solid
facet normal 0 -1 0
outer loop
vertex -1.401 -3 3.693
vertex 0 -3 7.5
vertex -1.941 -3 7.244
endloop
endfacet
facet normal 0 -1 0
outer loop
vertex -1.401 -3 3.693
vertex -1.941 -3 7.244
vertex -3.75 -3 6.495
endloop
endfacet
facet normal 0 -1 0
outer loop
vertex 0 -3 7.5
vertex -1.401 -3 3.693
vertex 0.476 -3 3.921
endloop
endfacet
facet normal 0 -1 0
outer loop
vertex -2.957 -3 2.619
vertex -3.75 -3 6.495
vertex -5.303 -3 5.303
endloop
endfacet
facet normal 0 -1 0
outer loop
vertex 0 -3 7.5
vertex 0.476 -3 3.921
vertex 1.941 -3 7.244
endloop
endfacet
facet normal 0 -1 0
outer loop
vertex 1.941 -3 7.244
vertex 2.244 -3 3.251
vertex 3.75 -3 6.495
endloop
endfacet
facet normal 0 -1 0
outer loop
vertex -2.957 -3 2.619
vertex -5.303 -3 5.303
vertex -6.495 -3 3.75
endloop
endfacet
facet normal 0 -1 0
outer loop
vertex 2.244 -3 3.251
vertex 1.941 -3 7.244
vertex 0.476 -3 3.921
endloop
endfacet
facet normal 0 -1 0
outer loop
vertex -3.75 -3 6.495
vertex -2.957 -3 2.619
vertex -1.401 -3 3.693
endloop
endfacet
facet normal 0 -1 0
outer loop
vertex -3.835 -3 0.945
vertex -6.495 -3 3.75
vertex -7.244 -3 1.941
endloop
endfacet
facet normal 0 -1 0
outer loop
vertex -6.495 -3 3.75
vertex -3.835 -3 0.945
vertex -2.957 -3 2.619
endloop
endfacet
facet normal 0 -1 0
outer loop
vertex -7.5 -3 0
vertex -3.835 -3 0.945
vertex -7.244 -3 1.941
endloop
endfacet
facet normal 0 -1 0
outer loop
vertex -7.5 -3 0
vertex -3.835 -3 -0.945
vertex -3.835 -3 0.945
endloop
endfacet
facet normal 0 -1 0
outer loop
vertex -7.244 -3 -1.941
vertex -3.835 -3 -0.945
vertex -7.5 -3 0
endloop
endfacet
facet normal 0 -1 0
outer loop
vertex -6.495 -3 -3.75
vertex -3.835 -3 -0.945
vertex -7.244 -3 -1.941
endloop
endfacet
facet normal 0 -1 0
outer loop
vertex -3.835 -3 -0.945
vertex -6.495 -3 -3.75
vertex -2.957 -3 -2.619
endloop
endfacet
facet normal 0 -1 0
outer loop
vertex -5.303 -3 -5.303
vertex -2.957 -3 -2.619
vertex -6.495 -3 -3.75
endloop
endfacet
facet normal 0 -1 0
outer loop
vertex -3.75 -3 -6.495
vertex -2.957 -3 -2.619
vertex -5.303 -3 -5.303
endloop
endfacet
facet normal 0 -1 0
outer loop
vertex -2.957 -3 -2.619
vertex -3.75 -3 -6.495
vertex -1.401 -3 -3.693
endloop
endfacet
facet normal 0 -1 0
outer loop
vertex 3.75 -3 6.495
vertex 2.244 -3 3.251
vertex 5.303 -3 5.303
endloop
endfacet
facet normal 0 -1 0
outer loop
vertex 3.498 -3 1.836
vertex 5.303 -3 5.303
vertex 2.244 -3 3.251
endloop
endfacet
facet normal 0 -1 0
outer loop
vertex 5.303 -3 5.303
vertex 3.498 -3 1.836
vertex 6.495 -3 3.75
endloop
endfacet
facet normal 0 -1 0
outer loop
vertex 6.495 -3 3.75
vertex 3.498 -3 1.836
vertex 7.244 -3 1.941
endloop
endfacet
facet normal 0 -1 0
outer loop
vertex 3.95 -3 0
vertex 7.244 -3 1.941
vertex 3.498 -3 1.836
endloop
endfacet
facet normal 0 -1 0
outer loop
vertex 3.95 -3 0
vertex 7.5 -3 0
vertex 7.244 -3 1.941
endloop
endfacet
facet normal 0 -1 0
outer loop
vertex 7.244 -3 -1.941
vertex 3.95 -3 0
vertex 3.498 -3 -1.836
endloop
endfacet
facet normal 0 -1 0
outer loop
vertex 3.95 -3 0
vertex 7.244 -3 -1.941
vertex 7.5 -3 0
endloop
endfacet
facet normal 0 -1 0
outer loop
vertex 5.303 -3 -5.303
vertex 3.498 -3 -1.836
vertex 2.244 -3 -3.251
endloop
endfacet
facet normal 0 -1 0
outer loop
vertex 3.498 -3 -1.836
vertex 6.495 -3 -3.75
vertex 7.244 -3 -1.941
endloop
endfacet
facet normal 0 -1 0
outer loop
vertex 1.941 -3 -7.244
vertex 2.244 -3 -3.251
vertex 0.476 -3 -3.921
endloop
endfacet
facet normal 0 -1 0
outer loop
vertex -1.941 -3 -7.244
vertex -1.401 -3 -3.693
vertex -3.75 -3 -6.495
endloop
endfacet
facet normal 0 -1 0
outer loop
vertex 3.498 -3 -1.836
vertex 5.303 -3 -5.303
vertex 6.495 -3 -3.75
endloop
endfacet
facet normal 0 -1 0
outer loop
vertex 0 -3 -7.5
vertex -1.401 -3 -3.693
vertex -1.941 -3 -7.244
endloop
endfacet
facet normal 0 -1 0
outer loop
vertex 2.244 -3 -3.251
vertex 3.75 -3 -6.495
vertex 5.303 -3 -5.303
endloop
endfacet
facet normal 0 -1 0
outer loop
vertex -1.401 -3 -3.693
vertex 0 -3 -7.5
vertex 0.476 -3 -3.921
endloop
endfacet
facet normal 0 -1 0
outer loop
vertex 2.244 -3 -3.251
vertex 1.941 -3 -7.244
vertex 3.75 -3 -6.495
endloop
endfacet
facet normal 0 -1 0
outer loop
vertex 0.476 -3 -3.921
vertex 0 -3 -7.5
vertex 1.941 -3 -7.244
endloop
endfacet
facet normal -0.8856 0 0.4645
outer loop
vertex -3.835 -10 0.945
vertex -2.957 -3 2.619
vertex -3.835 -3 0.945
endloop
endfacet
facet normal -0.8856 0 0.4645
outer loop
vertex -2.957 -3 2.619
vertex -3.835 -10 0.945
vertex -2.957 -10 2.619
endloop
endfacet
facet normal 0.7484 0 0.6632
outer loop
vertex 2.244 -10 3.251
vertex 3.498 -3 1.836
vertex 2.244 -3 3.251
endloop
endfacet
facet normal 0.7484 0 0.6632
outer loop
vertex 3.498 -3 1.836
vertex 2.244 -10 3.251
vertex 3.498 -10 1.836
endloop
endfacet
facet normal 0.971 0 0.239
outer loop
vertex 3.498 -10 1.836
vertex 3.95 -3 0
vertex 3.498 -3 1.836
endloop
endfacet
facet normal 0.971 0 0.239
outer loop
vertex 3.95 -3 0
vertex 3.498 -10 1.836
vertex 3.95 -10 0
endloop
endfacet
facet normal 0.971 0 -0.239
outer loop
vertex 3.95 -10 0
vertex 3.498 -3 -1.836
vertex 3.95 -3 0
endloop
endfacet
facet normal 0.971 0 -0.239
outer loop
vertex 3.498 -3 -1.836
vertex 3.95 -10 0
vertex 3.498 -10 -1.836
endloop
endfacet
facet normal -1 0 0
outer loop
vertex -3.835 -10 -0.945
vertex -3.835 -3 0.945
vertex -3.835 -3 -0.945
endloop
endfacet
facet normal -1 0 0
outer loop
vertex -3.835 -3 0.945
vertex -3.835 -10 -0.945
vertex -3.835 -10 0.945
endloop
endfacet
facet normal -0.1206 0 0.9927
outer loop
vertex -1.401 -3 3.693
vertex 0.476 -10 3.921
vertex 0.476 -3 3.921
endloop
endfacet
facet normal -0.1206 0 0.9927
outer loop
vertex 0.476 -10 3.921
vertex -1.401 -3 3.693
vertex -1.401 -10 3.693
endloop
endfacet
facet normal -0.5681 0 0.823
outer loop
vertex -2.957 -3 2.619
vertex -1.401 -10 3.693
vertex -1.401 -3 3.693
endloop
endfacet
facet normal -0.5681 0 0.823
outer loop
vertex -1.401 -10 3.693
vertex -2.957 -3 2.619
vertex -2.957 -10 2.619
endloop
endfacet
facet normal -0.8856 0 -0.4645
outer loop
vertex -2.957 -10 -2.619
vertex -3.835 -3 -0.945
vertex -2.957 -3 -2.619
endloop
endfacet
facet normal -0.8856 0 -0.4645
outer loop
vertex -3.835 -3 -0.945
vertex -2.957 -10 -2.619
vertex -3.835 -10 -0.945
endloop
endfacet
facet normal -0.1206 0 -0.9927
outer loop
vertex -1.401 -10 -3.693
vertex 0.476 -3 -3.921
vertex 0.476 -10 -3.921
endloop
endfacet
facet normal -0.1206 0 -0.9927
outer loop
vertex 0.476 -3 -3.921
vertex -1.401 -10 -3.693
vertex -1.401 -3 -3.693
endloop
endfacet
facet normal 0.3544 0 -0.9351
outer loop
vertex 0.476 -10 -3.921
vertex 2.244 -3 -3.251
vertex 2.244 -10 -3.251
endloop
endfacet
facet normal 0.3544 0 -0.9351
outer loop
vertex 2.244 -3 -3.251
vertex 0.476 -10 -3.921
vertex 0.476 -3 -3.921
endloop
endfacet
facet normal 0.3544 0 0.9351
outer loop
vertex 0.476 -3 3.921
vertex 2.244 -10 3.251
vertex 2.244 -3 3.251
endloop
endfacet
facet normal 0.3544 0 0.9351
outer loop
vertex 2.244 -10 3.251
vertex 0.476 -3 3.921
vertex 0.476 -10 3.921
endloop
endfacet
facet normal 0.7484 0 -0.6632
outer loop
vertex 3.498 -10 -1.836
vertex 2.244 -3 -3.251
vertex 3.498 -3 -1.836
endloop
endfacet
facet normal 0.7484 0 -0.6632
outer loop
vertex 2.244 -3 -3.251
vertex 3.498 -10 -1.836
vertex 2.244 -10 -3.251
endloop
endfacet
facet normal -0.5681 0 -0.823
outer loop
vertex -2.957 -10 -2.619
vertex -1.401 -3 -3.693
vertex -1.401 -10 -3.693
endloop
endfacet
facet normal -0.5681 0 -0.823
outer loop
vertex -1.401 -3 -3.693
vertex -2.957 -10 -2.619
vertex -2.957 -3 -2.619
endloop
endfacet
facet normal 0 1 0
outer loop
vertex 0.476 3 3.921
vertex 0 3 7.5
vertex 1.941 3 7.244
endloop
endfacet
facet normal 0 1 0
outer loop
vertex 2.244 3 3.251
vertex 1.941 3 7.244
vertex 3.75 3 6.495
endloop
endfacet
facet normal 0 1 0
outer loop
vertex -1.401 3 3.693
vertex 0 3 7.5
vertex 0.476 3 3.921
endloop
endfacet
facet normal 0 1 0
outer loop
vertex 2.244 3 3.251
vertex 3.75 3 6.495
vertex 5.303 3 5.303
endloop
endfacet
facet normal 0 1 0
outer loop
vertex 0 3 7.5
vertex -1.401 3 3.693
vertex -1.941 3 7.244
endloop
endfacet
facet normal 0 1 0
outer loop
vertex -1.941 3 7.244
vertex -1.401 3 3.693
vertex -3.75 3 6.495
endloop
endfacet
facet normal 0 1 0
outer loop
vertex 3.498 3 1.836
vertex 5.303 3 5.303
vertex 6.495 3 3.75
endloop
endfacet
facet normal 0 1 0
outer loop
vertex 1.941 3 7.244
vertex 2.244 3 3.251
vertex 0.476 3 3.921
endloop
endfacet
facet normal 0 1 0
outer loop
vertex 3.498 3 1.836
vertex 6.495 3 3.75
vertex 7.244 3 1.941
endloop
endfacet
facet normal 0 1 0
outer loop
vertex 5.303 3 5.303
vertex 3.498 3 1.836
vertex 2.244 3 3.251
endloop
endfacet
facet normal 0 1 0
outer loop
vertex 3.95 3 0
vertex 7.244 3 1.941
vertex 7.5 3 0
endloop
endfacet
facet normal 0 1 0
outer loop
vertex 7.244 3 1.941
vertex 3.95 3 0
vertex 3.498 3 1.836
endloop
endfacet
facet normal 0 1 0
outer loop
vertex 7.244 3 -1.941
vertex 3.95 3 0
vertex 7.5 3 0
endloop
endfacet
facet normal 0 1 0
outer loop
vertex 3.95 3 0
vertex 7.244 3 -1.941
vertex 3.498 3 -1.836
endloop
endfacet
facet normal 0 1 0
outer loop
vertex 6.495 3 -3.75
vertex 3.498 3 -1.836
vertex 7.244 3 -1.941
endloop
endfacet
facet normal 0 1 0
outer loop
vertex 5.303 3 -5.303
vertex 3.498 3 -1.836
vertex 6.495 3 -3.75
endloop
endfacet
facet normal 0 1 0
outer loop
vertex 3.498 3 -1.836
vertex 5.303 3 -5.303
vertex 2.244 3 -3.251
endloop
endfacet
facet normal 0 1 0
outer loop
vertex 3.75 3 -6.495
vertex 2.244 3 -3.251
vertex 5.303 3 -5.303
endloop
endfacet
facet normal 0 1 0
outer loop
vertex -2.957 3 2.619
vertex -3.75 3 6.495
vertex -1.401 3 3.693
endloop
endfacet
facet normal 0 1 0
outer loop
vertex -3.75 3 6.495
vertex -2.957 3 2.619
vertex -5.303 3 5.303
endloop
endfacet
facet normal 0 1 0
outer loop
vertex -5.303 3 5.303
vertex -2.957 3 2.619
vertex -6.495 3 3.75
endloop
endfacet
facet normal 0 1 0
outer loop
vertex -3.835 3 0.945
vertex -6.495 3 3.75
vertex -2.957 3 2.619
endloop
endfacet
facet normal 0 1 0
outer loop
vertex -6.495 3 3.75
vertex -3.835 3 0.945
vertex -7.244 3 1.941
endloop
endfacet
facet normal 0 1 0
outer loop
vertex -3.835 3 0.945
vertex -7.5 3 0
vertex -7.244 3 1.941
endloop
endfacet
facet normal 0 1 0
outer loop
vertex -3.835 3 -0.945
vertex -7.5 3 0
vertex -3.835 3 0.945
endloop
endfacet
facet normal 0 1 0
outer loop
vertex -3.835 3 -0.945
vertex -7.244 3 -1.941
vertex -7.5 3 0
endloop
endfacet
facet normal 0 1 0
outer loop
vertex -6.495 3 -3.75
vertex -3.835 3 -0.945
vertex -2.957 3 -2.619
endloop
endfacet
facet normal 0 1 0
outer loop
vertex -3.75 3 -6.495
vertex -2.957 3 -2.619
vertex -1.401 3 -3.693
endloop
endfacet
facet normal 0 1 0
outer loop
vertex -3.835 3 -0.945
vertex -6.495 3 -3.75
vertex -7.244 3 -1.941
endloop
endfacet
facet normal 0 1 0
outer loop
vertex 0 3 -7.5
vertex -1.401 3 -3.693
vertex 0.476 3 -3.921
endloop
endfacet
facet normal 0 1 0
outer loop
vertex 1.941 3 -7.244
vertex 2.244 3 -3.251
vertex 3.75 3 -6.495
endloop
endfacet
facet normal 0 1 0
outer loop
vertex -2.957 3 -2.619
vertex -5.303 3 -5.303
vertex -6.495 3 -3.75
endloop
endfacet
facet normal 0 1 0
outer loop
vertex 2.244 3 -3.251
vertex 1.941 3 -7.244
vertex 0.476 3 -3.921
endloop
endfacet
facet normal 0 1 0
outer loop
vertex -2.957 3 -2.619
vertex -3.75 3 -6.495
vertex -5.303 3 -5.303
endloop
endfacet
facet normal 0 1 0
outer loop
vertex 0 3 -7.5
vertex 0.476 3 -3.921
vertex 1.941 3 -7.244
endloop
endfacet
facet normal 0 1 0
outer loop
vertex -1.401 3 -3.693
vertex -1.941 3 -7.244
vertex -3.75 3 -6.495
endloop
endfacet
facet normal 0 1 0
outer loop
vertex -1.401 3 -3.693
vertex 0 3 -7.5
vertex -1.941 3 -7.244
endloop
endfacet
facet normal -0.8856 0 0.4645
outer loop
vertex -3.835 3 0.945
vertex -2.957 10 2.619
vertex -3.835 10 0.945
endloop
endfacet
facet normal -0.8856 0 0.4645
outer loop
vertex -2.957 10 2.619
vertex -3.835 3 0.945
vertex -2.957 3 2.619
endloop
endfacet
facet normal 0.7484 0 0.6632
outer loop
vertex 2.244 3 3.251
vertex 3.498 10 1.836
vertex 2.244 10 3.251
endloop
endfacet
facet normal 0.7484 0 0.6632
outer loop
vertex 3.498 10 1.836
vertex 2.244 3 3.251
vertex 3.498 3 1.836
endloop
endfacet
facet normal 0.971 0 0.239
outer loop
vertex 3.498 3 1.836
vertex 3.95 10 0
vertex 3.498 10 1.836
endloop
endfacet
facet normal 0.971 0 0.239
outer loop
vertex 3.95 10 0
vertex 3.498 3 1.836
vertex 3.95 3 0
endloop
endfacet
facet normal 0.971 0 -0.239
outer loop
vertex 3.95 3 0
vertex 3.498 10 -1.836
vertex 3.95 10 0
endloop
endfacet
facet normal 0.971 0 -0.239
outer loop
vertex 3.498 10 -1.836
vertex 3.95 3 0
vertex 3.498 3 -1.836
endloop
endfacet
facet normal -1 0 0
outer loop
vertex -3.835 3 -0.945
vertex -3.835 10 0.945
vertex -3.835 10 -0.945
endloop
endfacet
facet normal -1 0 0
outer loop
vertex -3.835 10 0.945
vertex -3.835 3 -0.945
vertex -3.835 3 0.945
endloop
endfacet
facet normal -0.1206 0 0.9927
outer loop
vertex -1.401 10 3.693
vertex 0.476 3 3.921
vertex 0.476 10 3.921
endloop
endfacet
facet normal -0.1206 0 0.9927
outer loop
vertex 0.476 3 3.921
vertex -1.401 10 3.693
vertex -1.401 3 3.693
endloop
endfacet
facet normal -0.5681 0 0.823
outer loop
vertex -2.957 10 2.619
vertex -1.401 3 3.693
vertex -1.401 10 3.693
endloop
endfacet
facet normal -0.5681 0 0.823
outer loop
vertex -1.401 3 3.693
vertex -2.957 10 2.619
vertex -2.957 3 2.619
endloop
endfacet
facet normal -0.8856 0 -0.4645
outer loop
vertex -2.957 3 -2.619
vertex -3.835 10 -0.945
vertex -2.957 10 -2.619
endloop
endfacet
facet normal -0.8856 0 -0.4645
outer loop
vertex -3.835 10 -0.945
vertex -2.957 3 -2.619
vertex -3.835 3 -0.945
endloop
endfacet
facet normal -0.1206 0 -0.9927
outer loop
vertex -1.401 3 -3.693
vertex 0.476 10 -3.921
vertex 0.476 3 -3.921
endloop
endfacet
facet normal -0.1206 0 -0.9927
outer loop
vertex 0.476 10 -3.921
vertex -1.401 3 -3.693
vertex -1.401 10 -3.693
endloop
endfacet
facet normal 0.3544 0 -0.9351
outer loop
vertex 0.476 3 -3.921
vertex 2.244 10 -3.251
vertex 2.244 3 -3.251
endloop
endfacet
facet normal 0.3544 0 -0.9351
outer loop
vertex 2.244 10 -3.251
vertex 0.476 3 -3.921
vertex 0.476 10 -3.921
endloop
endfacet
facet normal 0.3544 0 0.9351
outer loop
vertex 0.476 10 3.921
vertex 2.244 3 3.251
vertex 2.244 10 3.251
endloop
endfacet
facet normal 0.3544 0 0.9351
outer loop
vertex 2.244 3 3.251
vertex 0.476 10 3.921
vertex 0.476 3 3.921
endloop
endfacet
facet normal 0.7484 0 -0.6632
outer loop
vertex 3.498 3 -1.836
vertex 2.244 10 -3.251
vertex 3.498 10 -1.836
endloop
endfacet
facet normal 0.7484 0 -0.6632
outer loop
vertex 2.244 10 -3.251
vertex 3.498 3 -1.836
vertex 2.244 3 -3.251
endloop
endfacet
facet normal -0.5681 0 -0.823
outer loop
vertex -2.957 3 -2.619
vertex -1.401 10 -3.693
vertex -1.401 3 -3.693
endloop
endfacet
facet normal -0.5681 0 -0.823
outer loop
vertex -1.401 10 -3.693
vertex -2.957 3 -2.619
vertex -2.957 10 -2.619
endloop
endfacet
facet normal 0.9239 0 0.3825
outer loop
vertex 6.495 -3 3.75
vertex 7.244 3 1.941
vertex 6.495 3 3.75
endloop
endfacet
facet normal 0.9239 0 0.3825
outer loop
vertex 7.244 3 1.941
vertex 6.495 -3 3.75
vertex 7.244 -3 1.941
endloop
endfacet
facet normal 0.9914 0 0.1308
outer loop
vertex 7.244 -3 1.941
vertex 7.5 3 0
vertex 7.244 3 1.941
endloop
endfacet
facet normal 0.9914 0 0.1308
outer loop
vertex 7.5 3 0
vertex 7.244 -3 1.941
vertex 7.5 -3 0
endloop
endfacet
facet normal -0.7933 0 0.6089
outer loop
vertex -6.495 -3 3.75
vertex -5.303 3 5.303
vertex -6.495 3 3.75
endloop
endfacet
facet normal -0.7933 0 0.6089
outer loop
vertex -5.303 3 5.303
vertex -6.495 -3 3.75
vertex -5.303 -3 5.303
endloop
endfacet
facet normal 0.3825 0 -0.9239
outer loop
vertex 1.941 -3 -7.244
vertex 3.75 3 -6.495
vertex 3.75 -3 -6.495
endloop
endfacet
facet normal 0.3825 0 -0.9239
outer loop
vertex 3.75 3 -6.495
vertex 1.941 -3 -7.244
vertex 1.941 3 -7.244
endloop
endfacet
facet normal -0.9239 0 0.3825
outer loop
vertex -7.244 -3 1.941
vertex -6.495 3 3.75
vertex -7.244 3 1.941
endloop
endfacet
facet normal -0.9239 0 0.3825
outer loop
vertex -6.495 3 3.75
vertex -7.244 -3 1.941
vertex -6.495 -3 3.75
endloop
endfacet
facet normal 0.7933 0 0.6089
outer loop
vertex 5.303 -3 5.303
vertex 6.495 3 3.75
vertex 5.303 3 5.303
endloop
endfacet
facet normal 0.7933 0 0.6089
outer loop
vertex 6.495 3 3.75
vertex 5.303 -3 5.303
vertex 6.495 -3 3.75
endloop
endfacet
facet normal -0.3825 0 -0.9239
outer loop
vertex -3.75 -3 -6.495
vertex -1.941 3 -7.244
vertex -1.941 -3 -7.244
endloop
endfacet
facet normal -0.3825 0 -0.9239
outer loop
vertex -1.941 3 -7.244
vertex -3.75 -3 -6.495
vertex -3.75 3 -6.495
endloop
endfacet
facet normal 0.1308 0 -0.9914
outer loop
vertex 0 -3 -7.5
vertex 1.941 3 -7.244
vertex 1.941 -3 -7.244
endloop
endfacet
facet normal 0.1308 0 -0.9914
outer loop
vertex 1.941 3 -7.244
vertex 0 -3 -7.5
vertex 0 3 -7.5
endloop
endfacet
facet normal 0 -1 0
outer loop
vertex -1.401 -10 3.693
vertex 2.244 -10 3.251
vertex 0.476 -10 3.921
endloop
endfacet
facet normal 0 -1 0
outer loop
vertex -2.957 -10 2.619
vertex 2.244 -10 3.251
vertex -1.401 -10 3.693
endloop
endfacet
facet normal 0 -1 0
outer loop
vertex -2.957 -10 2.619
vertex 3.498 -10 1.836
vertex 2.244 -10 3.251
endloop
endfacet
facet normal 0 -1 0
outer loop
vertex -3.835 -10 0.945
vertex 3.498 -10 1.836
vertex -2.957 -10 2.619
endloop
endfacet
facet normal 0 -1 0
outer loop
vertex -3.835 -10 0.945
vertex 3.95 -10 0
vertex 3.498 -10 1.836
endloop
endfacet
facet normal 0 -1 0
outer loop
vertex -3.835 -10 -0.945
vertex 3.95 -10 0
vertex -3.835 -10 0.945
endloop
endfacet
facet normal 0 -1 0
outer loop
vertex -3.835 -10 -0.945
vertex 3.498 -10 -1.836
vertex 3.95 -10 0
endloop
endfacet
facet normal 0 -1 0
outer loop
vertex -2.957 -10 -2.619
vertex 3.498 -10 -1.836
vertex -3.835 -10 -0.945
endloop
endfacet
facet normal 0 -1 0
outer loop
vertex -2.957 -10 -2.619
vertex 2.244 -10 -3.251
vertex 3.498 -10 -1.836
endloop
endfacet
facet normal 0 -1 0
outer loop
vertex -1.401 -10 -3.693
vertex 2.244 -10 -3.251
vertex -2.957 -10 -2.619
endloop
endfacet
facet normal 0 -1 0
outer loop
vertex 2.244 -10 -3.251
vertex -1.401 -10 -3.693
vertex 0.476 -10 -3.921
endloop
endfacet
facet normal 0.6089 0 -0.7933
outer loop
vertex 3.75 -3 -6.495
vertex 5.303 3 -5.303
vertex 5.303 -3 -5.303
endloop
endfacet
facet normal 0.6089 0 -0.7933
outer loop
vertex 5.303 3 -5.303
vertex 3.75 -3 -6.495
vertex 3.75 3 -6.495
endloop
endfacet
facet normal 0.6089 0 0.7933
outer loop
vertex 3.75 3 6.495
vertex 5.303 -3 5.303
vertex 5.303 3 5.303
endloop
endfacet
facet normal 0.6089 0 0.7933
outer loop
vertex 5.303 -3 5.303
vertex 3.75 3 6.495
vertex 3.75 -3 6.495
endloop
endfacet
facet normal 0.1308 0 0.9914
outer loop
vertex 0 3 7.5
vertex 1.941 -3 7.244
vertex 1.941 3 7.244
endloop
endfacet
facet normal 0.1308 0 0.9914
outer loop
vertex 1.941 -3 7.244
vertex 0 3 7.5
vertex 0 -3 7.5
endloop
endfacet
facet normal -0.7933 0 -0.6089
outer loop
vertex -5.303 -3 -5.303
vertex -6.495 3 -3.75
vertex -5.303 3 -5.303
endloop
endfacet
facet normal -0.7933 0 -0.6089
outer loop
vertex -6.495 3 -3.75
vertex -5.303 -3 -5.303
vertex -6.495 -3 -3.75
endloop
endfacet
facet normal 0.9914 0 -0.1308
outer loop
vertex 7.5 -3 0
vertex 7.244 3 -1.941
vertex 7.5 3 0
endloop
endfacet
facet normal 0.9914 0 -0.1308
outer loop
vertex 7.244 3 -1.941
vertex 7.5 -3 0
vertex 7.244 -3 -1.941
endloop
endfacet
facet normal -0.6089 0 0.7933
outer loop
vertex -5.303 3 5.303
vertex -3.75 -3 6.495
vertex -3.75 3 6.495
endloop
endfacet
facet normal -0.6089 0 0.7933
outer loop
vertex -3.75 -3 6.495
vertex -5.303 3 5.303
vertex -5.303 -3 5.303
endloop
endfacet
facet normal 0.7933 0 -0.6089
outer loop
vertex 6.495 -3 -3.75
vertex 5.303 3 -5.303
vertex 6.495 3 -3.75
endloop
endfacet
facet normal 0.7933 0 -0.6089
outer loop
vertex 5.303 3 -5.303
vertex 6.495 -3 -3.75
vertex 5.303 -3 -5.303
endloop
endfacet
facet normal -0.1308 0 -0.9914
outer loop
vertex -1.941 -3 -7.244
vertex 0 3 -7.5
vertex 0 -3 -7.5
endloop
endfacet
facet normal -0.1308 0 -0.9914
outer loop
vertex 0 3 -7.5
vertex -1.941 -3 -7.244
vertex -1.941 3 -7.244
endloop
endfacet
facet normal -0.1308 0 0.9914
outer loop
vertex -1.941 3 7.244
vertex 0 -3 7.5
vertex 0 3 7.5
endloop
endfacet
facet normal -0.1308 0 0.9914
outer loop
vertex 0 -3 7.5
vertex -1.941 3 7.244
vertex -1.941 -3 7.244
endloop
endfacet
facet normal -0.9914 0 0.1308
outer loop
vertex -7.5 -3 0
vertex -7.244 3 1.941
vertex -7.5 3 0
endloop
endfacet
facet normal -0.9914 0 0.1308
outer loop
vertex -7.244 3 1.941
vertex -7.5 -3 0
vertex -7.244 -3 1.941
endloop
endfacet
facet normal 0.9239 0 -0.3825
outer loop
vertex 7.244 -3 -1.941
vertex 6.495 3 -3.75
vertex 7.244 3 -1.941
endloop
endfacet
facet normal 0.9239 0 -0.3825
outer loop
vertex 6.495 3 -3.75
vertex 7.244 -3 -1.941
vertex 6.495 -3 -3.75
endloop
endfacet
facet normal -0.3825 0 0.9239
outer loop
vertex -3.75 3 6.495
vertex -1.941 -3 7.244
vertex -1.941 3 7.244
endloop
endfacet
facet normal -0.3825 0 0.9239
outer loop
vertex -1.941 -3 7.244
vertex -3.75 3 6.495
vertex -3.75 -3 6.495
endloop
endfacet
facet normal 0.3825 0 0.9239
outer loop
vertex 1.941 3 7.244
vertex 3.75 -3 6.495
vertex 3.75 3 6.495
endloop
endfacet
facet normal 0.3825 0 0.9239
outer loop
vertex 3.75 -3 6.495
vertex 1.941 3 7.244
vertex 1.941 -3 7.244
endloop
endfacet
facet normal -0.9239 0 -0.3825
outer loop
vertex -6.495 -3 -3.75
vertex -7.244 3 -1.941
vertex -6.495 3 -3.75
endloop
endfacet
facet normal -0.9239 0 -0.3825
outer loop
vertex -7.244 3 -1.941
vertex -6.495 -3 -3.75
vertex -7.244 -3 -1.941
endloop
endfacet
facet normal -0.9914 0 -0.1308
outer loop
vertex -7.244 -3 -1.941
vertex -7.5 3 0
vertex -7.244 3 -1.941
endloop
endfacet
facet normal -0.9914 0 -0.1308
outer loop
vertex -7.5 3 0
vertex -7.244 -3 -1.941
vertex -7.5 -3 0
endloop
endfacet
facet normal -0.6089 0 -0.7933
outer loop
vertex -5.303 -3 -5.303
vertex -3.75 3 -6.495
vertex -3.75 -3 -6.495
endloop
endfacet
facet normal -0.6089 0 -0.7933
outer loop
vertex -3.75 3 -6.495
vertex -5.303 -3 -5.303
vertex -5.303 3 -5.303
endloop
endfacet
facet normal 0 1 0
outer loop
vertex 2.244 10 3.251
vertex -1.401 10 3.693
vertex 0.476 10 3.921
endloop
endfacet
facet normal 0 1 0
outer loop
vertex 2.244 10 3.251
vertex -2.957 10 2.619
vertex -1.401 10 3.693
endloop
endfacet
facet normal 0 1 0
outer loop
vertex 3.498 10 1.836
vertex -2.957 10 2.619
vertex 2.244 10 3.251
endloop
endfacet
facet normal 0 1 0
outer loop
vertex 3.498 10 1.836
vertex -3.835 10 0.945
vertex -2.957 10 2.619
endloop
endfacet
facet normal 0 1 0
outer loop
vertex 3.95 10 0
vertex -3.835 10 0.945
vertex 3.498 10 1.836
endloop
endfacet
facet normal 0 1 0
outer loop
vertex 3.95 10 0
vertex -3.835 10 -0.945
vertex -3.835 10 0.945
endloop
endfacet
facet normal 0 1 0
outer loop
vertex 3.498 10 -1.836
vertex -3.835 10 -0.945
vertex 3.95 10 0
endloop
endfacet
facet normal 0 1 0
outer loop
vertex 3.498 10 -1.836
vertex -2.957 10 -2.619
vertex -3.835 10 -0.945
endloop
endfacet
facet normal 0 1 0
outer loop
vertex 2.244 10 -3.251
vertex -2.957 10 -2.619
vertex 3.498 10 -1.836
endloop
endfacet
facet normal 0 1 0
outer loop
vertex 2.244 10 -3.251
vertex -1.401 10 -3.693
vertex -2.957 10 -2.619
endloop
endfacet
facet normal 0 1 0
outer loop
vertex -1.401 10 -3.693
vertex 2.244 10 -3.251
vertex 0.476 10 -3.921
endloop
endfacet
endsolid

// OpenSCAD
module belt_idler() {
	module bearing_mount() {
		difference() {
			rotate([90,0,0]) cylinder(h=7, r=22/2, center=true);
			rotate([90,0,0]) translate([0, 0, -0.5]) cylinder(h=8, r=3.95, center=true);
		}
	}

	h = (7*2) + 6;
	difference() {
		rotate([90,0,0]) cylinder(r=7.5, h=h, center=true);
		translate([0,-(h/2)+(7/2)-0.0001,0]) bearing_mount();
		translate([0,(h/2)-(7/2)+0.0001,0]) bearing_mount();
	}
}

belt_idler();
